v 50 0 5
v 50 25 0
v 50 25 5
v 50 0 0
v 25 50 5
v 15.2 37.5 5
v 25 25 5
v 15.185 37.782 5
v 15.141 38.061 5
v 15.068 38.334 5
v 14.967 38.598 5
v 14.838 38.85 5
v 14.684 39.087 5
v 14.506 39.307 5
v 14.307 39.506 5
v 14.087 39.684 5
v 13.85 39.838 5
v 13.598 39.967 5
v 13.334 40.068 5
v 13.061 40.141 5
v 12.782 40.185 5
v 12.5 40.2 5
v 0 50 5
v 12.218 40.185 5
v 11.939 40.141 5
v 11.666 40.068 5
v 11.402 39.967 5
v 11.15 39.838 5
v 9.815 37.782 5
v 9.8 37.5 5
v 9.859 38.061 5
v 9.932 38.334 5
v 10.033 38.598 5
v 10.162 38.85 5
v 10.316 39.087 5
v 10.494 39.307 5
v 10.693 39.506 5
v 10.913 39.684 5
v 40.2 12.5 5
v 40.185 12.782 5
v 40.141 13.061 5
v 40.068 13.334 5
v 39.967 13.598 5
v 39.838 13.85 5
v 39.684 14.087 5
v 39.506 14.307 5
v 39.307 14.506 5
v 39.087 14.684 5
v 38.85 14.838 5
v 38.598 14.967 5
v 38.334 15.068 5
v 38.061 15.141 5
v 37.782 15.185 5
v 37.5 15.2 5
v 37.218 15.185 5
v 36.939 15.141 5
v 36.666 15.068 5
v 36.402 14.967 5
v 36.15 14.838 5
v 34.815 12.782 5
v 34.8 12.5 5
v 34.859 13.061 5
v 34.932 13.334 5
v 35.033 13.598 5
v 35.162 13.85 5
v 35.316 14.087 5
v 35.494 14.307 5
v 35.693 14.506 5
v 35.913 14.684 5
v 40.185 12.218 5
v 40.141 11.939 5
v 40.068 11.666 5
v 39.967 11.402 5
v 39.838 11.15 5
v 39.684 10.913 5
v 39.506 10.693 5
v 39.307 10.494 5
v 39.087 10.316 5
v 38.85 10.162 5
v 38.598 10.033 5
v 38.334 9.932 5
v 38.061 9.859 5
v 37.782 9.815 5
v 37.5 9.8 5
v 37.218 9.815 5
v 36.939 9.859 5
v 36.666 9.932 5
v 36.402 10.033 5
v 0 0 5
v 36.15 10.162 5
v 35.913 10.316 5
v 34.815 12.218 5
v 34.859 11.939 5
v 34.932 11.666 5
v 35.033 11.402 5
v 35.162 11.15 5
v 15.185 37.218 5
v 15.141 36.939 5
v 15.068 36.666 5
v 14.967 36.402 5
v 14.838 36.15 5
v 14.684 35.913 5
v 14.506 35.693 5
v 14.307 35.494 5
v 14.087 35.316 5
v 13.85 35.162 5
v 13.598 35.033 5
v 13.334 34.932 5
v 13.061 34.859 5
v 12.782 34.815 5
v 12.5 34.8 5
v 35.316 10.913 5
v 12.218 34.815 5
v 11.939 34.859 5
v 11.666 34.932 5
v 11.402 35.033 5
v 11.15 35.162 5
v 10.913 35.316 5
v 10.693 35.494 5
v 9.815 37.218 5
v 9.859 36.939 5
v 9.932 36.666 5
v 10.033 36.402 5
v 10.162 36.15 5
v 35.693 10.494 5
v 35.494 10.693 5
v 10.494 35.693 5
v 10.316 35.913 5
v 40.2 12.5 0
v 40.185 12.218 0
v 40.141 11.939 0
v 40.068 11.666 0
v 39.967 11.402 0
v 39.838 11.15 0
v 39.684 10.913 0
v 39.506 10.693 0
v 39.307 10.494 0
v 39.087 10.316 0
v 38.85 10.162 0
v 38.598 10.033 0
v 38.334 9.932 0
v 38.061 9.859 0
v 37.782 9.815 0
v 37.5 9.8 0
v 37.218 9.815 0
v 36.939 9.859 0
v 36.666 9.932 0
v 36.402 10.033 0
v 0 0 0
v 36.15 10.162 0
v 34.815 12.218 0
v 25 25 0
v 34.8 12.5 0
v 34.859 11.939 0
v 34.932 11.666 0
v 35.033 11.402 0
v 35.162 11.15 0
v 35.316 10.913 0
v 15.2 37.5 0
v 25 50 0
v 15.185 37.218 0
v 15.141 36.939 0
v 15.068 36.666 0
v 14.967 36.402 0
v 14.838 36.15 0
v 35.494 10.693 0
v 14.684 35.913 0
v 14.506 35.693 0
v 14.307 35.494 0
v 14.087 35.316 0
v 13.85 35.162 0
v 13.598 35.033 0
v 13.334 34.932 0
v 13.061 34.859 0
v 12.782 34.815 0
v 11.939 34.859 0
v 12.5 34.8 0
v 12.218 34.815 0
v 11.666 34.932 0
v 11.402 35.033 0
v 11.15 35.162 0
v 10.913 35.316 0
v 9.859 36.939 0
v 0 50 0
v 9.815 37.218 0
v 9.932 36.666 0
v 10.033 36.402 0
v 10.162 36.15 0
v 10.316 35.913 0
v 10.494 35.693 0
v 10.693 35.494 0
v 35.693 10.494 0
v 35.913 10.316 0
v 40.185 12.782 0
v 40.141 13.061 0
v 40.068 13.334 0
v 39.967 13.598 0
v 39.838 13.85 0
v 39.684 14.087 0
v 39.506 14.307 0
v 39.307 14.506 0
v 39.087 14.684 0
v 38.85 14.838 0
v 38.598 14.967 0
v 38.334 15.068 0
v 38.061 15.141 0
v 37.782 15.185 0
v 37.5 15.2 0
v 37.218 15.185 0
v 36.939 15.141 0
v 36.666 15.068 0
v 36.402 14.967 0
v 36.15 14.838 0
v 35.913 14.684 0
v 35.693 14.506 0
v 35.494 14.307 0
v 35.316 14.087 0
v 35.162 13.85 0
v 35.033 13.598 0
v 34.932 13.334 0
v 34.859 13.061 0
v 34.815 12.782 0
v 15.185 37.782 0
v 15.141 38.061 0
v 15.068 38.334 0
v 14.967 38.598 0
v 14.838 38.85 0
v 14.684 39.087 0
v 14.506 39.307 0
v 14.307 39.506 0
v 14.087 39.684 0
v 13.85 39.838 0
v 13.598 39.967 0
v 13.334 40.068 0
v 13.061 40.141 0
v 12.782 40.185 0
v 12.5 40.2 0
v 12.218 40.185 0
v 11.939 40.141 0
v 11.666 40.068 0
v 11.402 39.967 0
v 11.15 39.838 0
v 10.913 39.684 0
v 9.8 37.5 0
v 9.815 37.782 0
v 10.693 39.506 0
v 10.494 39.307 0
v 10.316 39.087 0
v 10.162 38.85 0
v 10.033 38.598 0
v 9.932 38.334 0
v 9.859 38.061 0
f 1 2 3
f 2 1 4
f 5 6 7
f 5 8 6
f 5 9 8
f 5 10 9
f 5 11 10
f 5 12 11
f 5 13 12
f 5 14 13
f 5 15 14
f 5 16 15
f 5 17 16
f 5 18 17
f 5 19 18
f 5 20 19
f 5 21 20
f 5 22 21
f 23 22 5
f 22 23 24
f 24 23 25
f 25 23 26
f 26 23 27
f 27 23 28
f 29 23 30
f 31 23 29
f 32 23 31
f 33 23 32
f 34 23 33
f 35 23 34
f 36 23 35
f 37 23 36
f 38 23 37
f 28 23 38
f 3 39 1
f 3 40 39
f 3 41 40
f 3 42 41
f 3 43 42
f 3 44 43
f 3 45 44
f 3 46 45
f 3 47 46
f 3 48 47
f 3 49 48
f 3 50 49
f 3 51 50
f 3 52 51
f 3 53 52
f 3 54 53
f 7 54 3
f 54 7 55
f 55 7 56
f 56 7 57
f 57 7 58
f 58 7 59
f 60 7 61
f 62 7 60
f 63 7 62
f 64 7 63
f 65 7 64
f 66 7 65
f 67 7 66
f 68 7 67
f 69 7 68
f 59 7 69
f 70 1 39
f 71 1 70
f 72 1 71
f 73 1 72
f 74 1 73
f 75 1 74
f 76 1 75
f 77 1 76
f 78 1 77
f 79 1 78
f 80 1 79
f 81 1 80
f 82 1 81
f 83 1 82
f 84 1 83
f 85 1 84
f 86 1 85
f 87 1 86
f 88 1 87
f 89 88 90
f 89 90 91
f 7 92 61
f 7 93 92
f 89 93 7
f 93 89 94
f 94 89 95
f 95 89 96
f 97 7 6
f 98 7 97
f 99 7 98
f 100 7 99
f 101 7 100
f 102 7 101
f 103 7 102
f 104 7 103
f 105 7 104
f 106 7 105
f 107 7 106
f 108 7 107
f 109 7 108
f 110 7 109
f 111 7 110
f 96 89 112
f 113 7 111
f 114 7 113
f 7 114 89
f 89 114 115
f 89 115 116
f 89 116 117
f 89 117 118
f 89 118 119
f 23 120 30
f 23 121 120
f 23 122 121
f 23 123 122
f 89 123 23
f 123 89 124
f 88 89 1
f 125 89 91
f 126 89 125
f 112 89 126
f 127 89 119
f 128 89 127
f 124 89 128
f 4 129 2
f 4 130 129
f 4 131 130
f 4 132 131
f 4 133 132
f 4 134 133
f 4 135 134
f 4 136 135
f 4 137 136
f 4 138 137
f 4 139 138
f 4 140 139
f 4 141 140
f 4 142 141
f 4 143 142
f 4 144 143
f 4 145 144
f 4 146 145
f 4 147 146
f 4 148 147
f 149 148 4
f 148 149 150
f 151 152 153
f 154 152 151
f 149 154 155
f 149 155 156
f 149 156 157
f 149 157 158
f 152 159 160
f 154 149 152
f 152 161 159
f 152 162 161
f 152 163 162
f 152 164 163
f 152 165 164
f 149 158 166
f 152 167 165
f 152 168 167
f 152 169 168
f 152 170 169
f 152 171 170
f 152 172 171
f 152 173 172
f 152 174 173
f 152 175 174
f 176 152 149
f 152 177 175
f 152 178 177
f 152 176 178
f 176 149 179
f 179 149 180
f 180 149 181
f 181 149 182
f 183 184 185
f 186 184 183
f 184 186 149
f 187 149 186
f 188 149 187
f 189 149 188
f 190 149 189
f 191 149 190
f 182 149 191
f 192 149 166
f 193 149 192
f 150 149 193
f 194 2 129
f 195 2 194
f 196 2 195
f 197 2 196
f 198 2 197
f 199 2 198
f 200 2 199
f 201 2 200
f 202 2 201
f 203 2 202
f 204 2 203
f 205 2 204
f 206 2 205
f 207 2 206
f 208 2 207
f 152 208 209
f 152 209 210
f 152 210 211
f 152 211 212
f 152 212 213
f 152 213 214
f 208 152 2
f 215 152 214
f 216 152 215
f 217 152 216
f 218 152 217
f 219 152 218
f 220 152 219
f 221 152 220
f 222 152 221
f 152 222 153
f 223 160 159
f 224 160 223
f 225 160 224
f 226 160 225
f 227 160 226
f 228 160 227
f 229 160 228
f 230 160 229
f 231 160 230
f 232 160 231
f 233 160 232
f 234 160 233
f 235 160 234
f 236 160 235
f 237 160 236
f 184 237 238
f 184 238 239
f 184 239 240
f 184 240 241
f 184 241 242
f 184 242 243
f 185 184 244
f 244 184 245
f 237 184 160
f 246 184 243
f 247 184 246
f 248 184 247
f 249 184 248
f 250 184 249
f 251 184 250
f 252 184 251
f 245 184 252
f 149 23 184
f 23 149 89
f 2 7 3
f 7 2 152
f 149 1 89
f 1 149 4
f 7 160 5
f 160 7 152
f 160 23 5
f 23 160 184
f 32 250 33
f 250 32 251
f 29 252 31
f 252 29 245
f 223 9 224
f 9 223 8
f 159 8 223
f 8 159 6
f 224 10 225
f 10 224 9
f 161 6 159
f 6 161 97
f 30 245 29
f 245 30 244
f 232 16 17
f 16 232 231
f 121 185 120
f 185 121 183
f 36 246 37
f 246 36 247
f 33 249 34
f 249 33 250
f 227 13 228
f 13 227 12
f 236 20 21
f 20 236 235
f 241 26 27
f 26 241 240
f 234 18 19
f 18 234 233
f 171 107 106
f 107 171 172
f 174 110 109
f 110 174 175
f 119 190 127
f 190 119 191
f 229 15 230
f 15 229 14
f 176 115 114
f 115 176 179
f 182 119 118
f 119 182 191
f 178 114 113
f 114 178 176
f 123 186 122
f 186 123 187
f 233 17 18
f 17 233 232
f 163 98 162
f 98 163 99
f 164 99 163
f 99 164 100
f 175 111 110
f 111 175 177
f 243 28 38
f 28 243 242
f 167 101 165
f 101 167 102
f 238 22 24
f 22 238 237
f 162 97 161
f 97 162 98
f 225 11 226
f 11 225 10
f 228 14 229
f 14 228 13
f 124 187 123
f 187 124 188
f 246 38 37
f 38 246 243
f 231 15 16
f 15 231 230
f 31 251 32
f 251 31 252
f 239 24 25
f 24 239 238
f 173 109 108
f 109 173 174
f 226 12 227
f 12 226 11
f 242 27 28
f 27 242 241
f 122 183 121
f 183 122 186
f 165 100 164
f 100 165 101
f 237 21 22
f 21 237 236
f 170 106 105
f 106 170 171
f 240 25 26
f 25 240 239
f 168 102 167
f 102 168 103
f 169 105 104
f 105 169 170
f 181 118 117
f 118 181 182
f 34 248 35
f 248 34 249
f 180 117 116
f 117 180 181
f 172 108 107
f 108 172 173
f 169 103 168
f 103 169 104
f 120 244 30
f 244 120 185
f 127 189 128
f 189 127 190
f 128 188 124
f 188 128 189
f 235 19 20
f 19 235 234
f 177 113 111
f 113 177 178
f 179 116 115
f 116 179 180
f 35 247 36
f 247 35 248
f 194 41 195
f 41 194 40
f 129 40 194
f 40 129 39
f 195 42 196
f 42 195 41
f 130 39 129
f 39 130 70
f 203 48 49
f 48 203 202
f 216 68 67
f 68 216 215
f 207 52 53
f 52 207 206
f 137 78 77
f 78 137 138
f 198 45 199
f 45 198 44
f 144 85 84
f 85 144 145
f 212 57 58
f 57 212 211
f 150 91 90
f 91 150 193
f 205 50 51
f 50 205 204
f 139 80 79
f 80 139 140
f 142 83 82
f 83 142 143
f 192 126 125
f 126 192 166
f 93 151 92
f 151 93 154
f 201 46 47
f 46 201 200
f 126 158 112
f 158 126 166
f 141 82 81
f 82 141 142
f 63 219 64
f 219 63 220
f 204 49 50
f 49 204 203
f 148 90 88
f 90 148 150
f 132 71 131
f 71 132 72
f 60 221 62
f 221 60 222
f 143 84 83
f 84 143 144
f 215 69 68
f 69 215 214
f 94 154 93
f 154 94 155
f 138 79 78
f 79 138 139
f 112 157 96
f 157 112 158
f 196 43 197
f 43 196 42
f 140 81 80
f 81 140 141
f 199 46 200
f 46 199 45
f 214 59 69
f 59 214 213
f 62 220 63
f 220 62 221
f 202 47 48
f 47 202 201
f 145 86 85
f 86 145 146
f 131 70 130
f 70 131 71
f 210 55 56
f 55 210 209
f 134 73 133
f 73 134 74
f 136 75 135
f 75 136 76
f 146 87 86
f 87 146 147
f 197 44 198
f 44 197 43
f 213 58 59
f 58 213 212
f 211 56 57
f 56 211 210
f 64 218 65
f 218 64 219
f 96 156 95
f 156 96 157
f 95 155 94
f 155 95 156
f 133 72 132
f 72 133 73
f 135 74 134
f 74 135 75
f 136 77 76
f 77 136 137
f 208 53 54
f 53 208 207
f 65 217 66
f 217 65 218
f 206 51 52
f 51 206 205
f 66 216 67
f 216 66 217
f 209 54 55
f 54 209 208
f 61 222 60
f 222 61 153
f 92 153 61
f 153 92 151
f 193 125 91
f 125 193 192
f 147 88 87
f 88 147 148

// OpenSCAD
// V-slot corner connector.
$fn = 60;
eps = 0.02;
profile = 25;
arm = 50;
plate_t = 5;
difference() {
    union() { cube([arm,profile,plate_t]); cube([profile,arm,plate_t]); }
    for (p=[[profile/2,arm-profile/2],[arm-profile/2,profile/2]]) translate([p[0],p[1],-eps]) cylinder(d=5.4,h=plate_t+2*eps);
}
